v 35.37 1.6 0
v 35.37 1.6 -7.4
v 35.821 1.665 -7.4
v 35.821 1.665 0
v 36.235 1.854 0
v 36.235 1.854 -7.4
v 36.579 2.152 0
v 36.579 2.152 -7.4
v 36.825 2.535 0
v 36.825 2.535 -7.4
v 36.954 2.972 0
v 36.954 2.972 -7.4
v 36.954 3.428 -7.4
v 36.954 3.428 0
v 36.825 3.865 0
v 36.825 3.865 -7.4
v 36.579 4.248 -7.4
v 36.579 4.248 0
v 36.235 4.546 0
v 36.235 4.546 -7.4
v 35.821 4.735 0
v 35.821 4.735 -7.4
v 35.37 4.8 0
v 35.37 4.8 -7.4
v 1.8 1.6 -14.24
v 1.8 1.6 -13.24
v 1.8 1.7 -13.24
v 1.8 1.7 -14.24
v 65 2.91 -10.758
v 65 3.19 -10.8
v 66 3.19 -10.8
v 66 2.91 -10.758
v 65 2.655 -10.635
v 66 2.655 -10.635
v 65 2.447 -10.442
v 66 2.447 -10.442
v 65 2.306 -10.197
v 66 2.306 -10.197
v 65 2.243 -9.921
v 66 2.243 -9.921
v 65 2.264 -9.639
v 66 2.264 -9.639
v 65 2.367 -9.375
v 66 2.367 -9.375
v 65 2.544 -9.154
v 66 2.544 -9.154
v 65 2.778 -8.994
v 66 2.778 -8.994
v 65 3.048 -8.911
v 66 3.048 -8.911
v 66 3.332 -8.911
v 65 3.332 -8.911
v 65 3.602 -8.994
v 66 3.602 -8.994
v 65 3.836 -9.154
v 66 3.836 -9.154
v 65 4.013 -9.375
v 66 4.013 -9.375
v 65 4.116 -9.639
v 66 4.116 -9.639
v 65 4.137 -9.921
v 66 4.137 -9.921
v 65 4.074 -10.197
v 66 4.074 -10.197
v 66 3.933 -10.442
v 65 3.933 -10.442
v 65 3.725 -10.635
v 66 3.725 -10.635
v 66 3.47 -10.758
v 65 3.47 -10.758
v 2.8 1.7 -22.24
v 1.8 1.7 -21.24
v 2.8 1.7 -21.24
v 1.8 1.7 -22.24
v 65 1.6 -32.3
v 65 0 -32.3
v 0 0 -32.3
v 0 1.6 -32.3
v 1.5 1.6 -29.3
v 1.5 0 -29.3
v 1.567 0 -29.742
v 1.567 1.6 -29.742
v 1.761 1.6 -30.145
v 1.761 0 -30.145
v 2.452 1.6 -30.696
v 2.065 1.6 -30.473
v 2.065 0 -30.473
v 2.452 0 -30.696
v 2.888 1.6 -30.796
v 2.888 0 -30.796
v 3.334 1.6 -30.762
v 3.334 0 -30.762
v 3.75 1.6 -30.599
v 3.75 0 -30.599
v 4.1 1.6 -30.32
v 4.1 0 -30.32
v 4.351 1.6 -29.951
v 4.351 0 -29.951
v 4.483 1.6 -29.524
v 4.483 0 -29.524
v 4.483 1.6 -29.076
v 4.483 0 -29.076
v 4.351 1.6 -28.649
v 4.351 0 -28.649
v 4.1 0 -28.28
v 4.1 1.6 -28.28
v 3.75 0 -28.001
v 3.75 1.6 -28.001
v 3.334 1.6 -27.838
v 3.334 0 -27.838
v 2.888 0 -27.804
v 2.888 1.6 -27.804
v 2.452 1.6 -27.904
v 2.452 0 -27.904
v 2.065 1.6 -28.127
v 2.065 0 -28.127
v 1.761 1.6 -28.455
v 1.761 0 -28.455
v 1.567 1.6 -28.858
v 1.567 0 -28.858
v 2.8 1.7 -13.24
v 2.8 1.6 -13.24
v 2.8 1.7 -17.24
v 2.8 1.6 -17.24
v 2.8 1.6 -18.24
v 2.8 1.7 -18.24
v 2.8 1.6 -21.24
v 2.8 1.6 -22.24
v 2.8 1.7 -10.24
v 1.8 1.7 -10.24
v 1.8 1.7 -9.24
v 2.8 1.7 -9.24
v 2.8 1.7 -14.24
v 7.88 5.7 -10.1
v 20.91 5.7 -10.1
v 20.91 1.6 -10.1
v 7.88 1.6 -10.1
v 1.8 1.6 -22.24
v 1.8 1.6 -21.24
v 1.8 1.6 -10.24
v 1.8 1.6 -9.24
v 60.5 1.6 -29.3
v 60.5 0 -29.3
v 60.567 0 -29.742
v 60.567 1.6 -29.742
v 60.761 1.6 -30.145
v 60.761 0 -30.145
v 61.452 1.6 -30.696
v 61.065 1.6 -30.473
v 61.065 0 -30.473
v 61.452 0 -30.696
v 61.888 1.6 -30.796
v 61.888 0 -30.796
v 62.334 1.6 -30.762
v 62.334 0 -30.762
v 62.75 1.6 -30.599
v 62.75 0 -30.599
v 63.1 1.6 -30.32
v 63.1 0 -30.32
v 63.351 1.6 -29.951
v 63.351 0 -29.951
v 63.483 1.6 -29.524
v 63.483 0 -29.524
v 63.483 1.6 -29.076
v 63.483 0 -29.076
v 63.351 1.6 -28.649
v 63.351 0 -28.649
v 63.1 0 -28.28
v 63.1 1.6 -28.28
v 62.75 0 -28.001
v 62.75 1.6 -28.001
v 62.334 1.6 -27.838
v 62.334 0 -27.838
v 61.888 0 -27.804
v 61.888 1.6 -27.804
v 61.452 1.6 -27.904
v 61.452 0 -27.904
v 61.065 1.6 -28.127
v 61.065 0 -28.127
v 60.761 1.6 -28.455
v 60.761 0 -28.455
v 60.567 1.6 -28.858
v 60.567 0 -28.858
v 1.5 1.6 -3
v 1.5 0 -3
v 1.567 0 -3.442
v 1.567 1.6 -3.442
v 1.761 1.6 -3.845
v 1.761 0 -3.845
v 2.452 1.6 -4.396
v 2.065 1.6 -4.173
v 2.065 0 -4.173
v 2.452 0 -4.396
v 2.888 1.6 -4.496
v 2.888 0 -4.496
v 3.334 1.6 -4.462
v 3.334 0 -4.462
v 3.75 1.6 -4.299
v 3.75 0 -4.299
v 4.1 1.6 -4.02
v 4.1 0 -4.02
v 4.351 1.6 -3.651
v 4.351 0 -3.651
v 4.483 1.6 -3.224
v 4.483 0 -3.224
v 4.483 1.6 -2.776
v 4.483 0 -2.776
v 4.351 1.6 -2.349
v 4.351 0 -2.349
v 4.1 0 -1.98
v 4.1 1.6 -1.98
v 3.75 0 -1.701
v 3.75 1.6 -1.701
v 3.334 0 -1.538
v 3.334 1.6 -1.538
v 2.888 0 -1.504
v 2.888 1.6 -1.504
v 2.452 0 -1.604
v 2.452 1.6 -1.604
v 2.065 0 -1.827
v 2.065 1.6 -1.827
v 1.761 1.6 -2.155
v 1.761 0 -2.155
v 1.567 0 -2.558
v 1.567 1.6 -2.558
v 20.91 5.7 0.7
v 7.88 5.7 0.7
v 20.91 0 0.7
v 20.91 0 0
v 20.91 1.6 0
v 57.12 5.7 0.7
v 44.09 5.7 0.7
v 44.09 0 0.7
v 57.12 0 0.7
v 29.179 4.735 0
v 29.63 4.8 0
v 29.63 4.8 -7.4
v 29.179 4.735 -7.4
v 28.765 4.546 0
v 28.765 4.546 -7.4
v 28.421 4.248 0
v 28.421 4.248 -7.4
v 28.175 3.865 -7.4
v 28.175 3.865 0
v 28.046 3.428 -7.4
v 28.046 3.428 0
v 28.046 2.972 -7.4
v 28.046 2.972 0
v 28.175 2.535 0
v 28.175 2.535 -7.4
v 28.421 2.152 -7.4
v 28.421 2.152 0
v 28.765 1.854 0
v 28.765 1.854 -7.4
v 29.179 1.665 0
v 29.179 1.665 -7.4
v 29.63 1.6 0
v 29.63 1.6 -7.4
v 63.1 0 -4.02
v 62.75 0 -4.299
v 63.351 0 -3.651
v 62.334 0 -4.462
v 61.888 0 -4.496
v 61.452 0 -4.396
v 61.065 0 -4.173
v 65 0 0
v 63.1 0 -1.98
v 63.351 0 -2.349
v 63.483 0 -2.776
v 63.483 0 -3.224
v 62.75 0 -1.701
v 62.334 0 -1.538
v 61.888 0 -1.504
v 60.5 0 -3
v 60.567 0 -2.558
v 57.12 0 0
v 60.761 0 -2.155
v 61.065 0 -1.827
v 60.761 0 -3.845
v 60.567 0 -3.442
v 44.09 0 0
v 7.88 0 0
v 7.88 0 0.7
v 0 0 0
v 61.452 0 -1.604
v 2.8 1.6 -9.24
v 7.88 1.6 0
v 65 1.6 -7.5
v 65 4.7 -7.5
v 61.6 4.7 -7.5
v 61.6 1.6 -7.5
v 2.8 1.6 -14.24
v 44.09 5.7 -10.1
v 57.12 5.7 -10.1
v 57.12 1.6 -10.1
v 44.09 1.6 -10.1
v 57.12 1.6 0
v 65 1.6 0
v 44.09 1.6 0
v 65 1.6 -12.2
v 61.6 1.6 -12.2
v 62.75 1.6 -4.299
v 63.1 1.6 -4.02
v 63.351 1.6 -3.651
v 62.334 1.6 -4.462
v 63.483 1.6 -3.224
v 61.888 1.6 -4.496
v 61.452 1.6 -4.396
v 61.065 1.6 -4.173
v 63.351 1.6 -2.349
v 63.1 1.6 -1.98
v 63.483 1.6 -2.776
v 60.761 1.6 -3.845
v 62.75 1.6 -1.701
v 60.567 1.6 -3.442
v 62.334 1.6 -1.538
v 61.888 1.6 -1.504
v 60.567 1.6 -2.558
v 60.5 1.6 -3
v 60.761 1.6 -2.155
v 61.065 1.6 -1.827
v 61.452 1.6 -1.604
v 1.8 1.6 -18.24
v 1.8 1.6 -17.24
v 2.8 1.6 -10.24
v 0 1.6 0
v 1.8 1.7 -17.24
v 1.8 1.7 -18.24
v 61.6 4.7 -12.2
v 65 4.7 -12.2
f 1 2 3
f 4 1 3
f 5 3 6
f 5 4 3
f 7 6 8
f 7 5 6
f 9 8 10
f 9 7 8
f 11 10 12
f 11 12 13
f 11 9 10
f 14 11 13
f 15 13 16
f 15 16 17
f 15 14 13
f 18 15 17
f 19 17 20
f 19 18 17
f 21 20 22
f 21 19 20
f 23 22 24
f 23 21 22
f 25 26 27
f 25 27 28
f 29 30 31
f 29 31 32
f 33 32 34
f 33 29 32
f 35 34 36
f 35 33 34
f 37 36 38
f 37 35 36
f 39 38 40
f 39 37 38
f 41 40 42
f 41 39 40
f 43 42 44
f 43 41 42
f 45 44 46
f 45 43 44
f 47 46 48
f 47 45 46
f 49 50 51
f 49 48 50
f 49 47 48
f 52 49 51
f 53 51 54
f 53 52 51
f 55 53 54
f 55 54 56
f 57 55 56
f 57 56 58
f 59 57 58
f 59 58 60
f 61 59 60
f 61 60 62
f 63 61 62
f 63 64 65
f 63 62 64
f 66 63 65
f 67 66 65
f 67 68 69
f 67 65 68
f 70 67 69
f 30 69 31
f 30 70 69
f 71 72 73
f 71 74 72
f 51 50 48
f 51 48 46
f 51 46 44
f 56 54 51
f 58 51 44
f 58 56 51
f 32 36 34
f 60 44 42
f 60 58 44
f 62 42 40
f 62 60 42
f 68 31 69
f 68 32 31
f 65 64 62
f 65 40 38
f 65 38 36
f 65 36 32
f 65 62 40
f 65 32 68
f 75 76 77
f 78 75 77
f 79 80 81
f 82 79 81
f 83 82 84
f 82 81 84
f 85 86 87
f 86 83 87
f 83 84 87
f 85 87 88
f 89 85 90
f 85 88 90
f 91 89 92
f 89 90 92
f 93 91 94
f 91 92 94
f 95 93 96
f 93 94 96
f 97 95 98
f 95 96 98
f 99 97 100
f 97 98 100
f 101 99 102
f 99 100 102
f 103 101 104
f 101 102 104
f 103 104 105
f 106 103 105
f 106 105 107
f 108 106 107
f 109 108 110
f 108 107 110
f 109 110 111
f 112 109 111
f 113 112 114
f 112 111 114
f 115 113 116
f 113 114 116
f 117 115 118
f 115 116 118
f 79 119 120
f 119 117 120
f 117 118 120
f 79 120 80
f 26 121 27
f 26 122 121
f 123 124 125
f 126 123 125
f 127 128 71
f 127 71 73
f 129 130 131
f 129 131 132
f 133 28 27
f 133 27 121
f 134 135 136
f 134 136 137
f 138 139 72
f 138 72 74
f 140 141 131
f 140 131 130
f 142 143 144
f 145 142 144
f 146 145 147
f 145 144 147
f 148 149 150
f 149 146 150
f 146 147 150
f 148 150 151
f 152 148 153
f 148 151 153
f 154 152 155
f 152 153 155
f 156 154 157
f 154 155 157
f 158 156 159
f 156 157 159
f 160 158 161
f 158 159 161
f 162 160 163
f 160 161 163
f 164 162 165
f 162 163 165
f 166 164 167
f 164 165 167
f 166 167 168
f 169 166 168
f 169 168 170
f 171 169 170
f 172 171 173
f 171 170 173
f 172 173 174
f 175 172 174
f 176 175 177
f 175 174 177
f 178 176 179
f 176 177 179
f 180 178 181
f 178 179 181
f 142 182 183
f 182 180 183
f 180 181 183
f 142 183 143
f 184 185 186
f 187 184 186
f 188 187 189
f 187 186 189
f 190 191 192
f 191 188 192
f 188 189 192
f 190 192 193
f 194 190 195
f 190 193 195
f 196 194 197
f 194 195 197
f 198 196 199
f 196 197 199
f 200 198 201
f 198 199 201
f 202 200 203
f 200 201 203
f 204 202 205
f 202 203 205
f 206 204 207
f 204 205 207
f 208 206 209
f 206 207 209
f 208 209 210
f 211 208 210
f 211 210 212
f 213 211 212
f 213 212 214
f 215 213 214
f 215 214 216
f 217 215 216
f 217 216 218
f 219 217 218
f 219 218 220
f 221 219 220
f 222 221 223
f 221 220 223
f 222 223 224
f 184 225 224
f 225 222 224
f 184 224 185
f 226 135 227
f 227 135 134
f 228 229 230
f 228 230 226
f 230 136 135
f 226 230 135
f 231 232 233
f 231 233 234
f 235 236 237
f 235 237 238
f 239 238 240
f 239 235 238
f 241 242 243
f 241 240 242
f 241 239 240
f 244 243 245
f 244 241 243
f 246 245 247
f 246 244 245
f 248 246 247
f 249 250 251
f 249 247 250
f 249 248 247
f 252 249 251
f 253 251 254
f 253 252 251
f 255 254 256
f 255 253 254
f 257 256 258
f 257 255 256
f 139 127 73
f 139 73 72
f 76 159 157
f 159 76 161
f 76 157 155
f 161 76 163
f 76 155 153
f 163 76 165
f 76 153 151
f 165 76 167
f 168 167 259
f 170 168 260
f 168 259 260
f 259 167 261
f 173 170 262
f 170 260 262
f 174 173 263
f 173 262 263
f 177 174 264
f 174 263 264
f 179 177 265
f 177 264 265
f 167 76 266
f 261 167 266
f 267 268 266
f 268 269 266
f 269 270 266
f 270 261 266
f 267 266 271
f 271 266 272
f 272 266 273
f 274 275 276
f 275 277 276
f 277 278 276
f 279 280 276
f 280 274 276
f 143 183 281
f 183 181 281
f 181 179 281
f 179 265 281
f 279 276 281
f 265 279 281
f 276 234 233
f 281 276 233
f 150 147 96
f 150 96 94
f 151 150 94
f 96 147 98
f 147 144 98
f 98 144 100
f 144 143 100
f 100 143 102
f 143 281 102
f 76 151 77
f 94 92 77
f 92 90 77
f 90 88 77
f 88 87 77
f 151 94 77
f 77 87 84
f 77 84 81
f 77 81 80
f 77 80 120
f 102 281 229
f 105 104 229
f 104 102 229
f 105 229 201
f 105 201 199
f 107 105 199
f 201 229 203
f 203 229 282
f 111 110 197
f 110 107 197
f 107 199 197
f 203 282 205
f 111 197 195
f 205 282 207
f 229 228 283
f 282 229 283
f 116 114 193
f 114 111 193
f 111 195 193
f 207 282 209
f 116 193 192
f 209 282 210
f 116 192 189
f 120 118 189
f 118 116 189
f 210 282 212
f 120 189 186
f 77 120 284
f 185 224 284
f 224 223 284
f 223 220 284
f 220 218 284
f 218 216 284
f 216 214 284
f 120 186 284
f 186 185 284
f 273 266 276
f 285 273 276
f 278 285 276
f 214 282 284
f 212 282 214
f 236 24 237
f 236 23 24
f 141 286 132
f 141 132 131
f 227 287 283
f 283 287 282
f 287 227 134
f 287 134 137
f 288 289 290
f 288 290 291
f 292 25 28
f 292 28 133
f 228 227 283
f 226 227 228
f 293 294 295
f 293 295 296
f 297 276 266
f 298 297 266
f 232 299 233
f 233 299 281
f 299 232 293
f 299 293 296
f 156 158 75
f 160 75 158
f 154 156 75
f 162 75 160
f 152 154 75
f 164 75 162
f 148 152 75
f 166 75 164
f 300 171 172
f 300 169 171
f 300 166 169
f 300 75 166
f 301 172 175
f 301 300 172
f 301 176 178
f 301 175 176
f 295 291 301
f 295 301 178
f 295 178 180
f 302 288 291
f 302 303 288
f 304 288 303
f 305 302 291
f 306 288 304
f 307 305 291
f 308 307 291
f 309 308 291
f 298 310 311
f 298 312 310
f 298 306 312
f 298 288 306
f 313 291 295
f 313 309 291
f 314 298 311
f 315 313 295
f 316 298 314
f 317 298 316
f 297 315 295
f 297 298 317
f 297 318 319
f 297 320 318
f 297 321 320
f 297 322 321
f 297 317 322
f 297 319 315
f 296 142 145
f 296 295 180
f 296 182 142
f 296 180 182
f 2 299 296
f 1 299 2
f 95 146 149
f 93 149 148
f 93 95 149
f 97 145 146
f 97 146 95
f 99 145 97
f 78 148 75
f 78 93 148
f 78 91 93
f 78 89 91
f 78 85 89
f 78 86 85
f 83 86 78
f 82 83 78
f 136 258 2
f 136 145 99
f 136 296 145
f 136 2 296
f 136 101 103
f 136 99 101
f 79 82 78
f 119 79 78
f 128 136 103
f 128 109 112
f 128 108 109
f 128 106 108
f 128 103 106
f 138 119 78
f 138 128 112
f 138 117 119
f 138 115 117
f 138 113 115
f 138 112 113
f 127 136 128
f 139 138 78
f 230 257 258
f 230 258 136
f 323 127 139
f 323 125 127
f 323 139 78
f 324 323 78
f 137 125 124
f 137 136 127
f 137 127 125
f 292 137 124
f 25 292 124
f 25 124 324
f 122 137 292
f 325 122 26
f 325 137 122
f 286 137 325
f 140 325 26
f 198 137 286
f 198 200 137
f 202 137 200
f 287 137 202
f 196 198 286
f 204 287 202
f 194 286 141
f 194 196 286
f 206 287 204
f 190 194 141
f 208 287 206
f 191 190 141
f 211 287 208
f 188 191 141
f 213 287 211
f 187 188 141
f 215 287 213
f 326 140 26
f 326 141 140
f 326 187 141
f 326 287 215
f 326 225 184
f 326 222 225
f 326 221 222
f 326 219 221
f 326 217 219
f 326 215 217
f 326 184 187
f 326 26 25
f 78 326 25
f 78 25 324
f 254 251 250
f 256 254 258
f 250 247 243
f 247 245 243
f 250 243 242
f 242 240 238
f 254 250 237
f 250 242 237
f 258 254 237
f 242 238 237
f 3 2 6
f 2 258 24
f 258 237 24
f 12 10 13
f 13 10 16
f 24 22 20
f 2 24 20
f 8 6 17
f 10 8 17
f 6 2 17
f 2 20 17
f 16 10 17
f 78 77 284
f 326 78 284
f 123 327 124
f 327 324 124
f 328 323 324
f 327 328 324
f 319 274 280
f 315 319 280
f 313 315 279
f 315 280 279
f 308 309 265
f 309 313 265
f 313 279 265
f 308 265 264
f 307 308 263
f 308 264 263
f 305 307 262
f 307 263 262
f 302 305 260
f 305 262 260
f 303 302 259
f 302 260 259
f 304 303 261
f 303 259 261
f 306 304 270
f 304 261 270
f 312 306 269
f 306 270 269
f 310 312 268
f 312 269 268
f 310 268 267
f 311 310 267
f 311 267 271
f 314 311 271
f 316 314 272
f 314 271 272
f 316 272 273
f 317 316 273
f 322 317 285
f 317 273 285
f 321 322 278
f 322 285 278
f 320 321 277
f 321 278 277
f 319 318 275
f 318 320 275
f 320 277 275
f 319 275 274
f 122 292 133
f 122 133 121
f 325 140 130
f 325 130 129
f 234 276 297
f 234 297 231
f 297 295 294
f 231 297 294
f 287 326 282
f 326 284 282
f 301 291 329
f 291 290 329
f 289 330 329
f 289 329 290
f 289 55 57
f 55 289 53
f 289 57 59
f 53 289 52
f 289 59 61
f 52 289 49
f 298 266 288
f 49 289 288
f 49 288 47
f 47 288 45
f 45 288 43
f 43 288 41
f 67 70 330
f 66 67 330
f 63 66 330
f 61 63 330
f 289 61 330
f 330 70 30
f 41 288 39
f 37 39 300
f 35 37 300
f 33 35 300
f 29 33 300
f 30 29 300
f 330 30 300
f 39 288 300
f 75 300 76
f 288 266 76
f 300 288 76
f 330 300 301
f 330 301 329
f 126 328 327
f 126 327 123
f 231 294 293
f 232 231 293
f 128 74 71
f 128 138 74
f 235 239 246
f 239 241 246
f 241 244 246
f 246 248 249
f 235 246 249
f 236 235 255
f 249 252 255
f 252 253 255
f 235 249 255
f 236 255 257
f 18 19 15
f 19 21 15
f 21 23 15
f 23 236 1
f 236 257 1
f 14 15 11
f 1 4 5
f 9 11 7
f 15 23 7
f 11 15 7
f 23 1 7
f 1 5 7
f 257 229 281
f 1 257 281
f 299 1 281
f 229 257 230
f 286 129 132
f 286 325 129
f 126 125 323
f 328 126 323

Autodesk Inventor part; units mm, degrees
ref_plane "YZ Plane" through (0, 0, 0) normal (1, 0, 0) x (0, 1, 0)
ref_plane "XZ Plane" through (0, 0, 0) normal (0, 1, 0) x (-1, 0, 0)
ref_plane "XY Plane" through (0, 0, 0) normal (0, 0, 1) x (1, 0, 0)
sketch "草圖1" plane through (0, 0, 0) normal (0, 1, 0) x (-1, 0, 0)
  line L0 (0, 0) -> (-65, 0)
  line L1 (-65, 0) -> (-65, -32.3)
  line L2 (-65, -32.3) -> (0, -32.3)
  line L3 (0, -32.3) -> (0, 0)
  circle A0 centre (-3, -3) radius 1.5
  circle A1 centre (-3, -29.3) radius 1.5
  circle A2 centre (-62, -3) radius 1.5
  circle A3 centre (-62, -29.3) radius 1.5
  dimension "d0" = 65
  dimension "d1" = 32.3
  dimension "d4" = 3
  dimension "d5" = 3
  dimension "d6" = 3
  dimension "d7" = 3
  dimension "d8" = 3
  dimension "d9" = 3
  dimension "d10" = 3
  dimension "d11" = 3
  dimension "d12" = 3
  dimension "d13" = 3
  dimension "d14" = 3
  dimension "d15" = 3
extrude "擠出1" add sketch "草圖1" along normal blind 1.6
sketch "草圖2" plane through (0, 0, 0) normal (0, 0, 1) x (1, 0, 0)
  line L0 (0, 0) -> (65, 0) projected
  line L1 (65, 0) -> (65, 1.6) projected
  line L2 (0, 1.6) -> (65, 1.6) projected
  line L3 (0, 0) -> (0, 1.6) projected
  line L4 (7.88, 0) -> (20.91, 0)
  line L5 (20.91, 0) -> (20.91, 5.7)
  line L6 (20.91, 5.7) -> (7.88, 5.7)
  line L7 (7.88, 5.7) -> (7.88, 0)
  line L8 (44.09, 0) -> (57.12, 0)
  line L9 (57.12, 0) -> (57.12, 5.7)
  line L10 (57.12, 5.7) -> (44.09, 5.7)
  line L11 (44.09, 5.7) -> (44.09, 0)
  point P0 (44.09, 1.6)
  point P1 (57.12, 1.6)
  dimension "d16" = 13.03
  dimension "d17" = 5.7
  dimension "d18" = 13.03
  dimension "d19" = 5.7
  dimension "d20" = 7.88
  dimension "d21" = 7.88
extrude "擠出2" add sketch "草圖2" along normal blind 0.7 contours L7 L2 L5 L0 | L7 L6 L5 L2 | L11 L2 L9 L0 | L11 L10 L9 L2
sketch "草圖3" plane through (0, 0, 0) normal (0, 0, -1) x (-1, 0, 0)
  line L0 (-7.88, 1.6) -> (-20.91, 1.6) projected
  line L1 (-7.88, 5.7) -> (-7.88, 1.6) projected
  line L2 (-20.91, 5.7) -> (-7.88, 5.7) projected
  line L3 (-20.91, 1.6) -> (-20.91, 5.7) projected
  line L4 (-57.12, 5.7) -> (-44.09, 5.7) projected
  line L5 (-44.09, 5.7) -> (-44.09, 1.6) projected
  line L6 (-57.12, 5.7) -> (-44.09, 5.7) projected
  line L7 (-57.12, 1.6) -> (-57.12, 5.7) projected
  line L8 (-7.88, 1.6) -> (-20.91, 1.6) projected
  line L9 (-7.88, 5.7) -> (-7.88, 1.6) projected
  line L10 (-20.91, 5.7) -> (-7.88, 5.7) projected
  line L11 (-20.91, 1.6) -> (-20.91, 5.7) projected
  line L12 (-44.09, 1.6) -> (-57.12, 1.6) projected
  point P0 (0, 0)
extrude "擠出3" add sketch "草圖3" along normal blind 10.1
sketch "草圖4" plane through (65, 0, 0) normal (0, 0, 1) x (1, 0, 0)
  line L0 (-44.09, 1.6) -> (-44.09, 0) projected
  line L1 (-65, 0) -> (-57.12, 0) projected
  line L2 (0, 0) -> (0, 1.6) projected
  line L3 (-7.88, 1.6) -> (0, 1.6) projected
  line L4 (-65, 1.6) -> (-57.12, 1.6) projected
  line L5 (-44.09, 1.6) -> (-20.91, 1.6) projected
  line L6 (-35.37, 1.6) -> (-29.63, 1.6)
  line L7 (-28.03, 3.2) -> (-28.03, 3.2)
  line L8 (-29.63, 4.8) -> (-35.37, 4.8)
  line L9 (-36.97, 3.2) -> (-36.97, 3.2)
  arc A0 (-35.37, 4.8) -> (-36.97, 3.2) centre (-35.37, 3.2) ccw
  arc A1 (-36.97, 3.2) -> (-35.37, 1.6) centre (-35.37, 3.2) ccw
  arc A2 (-29.63, 1.6) -> (-28.03, 3.2) centre (-29.63, 3.2) ccw
  arc A3 (-28.03, 3.2) -> (-29.63, 4.8) centre (-29.63, 3.2) ccw
  line L10 (0, 0) -> (-65, 0) projected
  line L11 (-57.12, 0) -> (-57.12, 1.6) projected
  line L12 (-65, 0) -> (-65, 1.6) projected
  line L13 (-44.09, 0) -> (-20.91, 0) projected
  line L14 (-20.91, 0) -> (-20.91, 1.6) projected
  line L15 (-7.88, 1.6) -> (-7.88, 0) projected
  line L16 (-7.88, 0) -> (0, 0) projected
  point P0 (-36.97, 1.6)
  point P1 (-28.03, 4.8)
  point P2 (-28.03, 1.6)
  point P3 (-36.97, 4.8)
  point P4 (-32.5, 4.8)
  point P5 (-32.5, 0)
  point P6 (-35.37, 1.6)
  point P7 (-29.63, 1.6)
  dimension "d26" = 8.94
  dimension "d27" = 3.2
  dimension "d28" = 1.6
extrude "擠出4" add sketch "草圖4" against normal blind 7.4 contours A1 A0 L8 A3 A2 L5
sketch "草圖5" plane through (65, 0, 0) normal (1, 0, 0) x (0, 0, -1)
  line L0 (0, 0) -> (32.3, 0) projected
  line L1 (32.3, 0) -> (32.3, 1.6) projected
  line L2 (0, 1.6) -> (32.3, 1.6) projected
  line L3 (0, 0) -> (0, 1.6) projected
  line L4 (7.5, 1.6) -> (12.2, 1.6)
  line L5 (12.2, 1.6) -> (12.2, 4.7)
  line L6 (12.2, 4.7) -> (7.5, 4.7)
  line L7 (7.5, 4.7) -> (7.5, 1.6)
  dimension "d31" = 4.7
  dimension "d32" = 3.1
  dimension "d33" = 7.5
extrude "擠出5" add sketch "草圖5" against normal blind 3.4 contours L7 L6 L5 L2
sketch "草圖6" plane through (65, 0, 0) normal (1, 0, 0) x (0, 0, -1)
  line L0 (0, 0) -> (32.3, 0) projected
  line L1 (32.3, 0) -> (32.3, 1.6) projected
  line L2 (12.2, 1.6) -> (32.3, 1.6) projected
  line L3 (12.2, 1.6) -> (12.2, 4.7) projected
  line L4 (12.2, 4.7) -> (7.5, 4.7) projected
  line L5 (7.5, 4.7) -> (7.5, 1.6) projected
  line L6 (0, 1.6) -> (7.5, 1.6) projected
  line L7 (0, 0) -> (0, 1.6) projected
  line L8 (7.5, 1.6) -> (12.2, 1.6)
  circle A0 centre (9.85, 3.19) radius 0.95
  dimension "d36" = 1.9
extrude "擠出6" add sketch "草圖6" along normal blind 1 contours A0
sketch "草圖7" plane through (0, 1.6, 0) normal (0, 1, 0) x (1, 0, 0)
  circle A0 centre (62, 29.3) radius 1.5 projected
  circle A1 centre (62, 3) radius 1.5 projected
  circle A2 centre (3, 29.3) radius 1.5 projected
  circle A3 centre (3, 3) radius 1.5 projected
  line L0 (65, 7.5) -> (61.6, 7.5) projected
  line L1 (61.6, 7.5) -> (61.6, 12.2) projected
  line L2 (61.6, 12.2) -> (65, 12.2) projected
  line L3 (65, 12.2) -> (65, 32.3) projected
  line L4 (65, 32.3) -> (0, 32.3) projected
  line L5 (0, 32.3) -> (0, 0) projected
  line L6 (0, 0) -> (7.88, 0) projected
  line L7 (7.88, 0) -> (7.88, 10.1) projected
  line L8 (7.88, 10.1) -> (20.91, 10.1) projected
  line L9 (20.91, 10.1) -> (20.91, 0) projected
  line L10 (20.91, 0) -> (29.63, 0) projected
  line L11 (29.63, 0) -> (29.63, 7.4) projected
  line L12 (29.63, 7.4) -> (35.37, 7.4) projected
  line L13 (35.37, 0) -> (35.37, 7.4) projected
  line L14 (35.37, 0) -> (44.09, 0) projected
  line L15 (44.09, 0) -> (44.09, 10.1) projected
  line L16 (44.09, 10.1) -> (57.12, 10.1) projected
  line L17 (57.12, 10.1) -> (57.12, 0) projected
  line L18 (57.12, 0) -> (65, 0) projected
  line L19 (65, 0) -> (65, 7.5) projected
  line L20 (1.8, 22.24) -> (2.8, 22.24)
  line L21 (2.8, 22.24) -> (2.8, 21.24)
  line L22 (2.8, 21.24) -> (1.8, 21.24)
  line L23 (1.8, 21.24) -> (1.8, 22.24)
  line L24 (1.8, 22.24) -> (2.8, 21.24) construction
  line L25 (2.8, 22.24) -> (1.8, 21.24) construction
  line L26 (1.8, 10.24) -> (2.8, 10.24)
  line L27 (2.8, 10.24) -> (2.8, 9.24)
  line L28 (2.8, 9.24) -> (1.8, 9.24)
  line L29 (1.8, 9.24) -> (1.8, 10.24)
  line L30 (1.8, 10.24) -> (2.8, 9.24) construction
  line L31 (2.8, 10.24) -> (1.8, 9.24) construction
  line L32 (1.8, 14.24) -> (2.8, 14.24)
  line L33 (2.8, 14.24) -> (2.8, 13.24)
  line L34 (2.8, 13.24) -> (1.8, 13.24)
  line L35 (1.8, 13.24) -> (1.8, 14.24)
  line L36 (1.8, 14.24) -> (2.8, 13.24) construction
  line L37 (2.8, 14.24) -> (1.8, 13.24) construction
  line L38 (1.8, 17.24) -> (2.8, 17.24)
  line L39 (2.8, 17.24) -> (2.8, 18.24)
  line L40 (2.8, 18.24) -> (1.8, 18.24)
  line L41 (1.8, 18.24) -> (1.8, 17.24)
  line L42 (1.8, 17.24) -> (2.8, 18.24) construction
  line L43 (2.8, 17.24) -> (1.8, 18.24) construction
  point P0 (2.3, 21.74)
  point P1 (2.3, 9.74)
  point P2 (2.3, 13.74)
  point P3 (2.3, 17.74)
  point P4 (2.3, 17.24)
  dimension "d39" = 1
  dimension "d40" = 1
  dimension "d41" = 1
  dimension "d42" = 1
  dimension "d43" = 1
  dimension "d44" = 1
  dimension "d45" = 1
  dimension "d46" = 1
  dimension "d47" = 2.3
  dimension "d48" = 10.56
  dimension "d55" = 4
  dimension "d56" = 4
  dimension "d57" = 4
extrude "擠出7" add sketch "草圖7" along normal blind 0.1 contours L20 L21 L22 L23 | L26 L27 L28 L29 | L32 L33 L34 L35 | L41 L40 L39 L38
equation "\"d18\" = d16"
equation "\"d19\" = d17"
equation "\"d21\" = d20"
properties part number "circuit board"
